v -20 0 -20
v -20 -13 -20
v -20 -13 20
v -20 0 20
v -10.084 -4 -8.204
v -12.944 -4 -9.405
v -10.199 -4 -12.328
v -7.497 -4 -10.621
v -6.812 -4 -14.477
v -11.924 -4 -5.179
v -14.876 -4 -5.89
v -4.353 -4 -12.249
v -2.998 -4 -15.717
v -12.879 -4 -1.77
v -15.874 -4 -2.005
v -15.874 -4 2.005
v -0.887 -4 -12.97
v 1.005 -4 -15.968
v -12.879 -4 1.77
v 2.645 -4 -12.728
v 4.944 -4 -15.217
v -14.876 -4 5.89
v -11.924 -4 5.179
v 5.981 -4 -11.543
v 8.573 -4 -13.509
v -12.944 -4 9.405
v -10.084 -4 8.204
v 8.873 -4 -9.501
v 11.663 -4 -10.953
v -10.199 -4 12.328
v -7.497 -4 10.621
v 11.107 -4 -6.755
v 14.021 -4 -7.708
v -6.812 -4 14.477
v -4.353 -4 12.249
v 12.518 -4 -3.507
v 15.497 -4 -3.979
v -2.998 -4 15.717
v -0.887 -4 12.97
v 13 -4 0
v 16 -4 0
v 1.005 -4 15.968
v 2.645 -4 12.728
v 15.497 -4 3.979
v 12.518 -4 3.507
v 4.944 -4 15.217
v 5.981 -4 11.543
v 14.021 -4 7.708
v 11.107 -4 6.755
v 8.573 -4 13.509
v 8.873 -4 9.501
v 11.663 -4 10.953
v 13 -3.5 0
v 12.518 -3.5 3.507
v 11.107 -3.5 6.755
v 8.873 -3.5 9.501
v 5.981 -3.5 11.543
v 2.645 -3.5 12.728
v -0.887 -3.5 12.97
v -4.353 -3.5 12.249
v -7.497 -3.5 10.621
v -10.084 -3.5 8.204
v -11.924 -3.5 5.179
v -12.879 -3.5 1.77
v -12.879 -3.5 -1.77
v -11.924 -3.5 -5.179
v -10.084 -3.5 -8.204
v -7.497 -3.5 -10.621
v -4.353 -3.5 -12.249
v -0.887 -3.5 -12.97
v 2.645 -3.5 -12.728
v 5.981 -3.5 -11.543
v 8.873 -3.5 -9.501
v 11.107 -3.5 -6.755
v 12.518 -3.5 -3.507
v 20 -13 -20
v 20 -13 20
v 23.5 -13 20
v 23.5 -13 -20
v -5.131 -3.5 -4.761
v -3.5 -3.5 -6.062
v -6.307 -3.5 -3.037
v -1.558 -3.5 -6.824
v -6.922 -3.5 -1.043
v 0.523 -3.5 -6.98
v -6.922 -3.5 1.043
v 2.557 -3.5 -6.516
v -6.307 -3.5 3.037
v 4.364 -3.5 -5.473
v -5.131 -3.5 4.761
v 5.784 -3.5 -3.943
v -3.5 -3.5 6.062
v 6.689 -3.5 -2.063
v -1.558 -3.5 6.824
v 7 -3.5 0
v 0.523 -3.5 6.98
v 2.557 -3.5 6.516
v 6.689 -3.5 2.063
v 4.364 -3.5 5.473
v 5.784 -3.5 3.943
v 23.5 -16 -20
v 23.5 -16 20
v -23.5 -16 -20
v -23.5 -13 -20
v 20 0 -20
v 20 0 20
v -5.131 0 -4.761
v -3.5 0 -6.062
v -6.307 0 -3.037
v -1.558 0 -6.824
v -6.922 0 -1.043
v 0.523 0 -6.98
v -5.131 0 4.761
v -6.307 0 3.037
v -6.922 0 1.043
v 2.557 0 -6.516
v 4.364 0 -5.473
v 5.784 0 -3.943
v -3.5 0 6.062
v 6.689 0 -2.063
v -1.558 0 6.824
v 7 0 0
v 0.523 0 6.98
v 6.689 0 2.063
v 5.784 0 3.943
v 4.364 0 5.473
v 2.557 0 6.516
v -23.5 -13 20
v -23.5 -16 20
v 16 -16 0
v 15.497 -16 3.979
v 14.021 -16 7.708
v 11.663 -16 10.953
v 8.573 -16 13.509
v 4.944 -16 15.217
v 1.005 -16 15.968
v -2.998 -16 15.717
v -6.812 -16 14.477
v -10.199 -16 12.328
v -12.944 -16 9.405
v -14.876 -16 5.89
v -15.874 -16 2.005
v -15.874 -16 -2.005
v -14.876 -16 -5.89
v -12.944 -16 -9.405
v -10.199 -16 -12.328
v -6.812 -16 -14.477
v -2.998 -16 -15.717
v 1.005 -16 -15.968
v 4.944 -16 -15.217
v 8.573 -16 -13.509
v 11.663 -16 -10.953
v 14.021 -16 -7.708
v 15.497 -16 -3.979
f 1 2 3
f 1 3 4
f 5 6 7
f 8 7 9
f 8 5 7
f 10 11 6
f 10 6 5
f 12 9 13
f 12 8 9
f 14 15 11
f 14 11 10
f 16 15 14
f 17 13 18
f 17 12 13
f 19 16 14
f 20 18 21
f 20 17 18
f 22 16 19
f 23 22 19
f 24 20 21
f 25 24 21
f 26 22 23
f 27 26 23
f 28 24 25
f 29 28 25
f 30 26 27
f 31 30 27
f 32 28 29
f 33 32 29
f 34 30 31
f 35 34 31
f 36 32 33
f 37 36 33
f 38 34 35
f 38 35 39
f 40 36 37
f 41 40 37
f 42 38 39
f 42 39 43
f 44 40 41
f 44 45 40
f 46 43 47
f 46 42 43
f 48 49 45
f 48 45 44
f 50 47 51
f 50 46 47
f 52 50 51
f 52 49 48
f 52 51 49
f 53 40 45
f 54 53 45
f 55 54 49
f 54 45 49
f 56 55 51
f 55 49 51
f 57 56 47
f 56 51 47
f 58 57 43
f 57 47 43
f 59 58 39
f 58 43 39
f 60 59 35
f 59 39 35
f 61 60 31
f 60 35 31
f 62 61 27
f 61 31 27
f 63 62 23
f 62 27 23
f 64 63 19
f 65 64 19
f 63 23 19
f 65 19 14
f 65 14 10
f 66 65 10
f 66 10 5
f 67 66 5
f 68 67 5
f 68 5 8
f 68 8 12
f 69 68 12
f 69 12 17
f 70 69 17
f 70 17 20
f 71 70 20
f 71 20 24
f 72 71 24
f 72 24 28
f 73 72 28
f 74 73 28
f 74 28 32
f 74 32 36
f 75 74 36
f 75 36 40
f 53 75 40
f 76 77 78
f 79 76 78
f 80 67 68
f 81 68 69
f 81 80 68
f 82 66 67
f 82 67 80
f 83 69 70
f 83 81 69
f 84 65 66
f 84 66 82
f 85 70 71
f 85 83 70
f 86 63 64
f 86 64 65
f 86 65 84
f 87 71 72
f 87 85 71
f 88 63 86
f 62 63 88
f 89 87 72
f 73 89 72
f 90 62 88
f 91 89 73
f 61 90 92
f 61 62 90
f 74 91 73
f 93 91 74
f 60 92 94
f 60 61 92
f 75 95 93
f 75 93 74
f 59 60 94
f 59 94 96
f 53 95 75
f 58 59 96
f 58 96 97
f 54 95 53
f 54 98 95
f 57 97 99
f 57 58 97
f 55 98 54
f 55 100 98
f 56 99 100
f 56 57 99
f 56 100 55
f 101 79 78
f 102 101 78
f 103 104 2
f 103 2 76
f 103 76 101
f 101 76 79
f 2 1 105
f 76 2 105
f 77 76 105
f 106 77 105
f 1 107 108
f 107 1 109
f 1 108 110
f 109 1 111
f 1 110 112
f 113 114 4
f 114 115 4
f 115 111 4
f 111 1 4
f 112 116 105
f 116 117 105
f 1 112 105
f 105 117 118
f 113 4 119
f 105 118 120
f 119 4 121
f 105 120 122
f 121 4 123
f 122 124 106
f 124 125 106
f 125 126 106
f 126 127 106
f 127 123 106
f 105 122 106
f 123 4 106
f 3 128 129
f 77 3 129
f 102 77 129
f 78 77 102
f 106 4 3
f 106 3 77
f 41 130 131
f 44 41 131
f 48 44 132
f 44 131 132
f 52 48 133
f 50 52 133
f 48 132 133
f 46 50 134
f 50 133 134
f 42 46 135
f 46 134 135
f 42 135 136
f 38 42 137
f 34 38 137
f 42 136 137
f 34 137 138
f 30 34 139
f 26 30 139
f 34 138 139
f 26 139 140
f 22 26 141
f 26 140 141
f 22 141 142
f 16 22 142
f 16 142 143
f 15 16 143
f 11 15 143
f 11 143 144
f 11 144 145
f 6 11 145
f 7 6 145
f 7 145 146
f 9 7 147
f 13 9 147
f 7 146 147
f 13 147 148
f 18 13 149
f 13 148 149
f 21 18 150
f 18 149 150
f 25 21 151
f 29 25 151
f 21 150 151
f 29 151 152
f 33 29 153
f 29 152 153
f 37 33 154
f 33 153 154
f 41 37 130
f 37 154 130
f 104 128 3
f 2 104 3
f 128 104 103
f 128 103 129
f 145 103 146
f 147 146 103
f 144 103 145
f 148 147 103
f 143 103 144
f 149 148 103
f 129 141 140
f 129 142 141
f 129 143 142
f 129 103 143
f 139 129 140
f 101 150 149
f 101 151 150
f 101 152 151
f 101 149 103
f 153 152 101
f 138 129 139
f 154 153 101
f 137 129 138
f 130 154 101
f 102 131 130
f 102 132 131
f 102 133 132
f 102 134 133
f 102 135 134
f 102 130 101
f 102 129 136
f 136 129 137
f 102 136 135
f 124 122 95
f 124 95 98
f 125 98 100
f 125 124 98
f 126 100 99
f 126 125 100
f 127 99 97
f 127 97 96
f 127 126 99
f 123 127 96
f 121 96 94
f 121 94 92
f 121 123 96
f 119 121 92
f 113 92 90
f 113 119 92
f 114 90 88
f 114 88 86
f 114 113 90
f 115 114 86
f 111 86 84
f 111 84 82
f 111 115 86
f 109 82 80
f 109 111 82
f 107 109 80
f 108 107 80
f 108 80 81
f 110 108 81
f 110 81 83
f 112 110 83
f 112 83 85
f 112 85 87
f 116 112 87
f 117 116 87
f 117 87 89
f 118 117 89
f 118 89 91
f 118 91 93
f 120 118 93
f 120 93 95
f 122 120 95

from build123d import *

# Parameters (mm, degrees)
F0_W     = 47
F0_H     = 40
F0_R     = 7
F1_DEPTH = 16
F2_W     = 3.5
F2_H     = 13
F3_DEPTH = 40.001
F4_R     = 13
F4_R_2   = 7
F5_DEPTH = 12.5
F6_R     = 16
F6_R_2   = 13
F7_DEPTH = 12


with BuildPart() as f1:
    # F0 (on Front) → F1 (new body)
    with BuildSketch(Plane.XZ):
        Rectangle(F0_W, F0_H)
        Circle(F0_R, mode=Mode.SUBTRACT)
    extrude(amount=F1_DEPTH)

    # F2 (on face) → F3 (cut, through all)
    with BuildSketch(Plane.XY.offset(20)):
        with Locations((-21.75, -6.5)):
            Rectangle(F2_W, F2_H)
        with Locations((21.75, -6.5)):
            Rectangle(F2_W, F2_H)
    extrude(amount=-F3_DEPTH, mode=Mode.SUBTRACT)

    # F4 (on face) → F5 (cut)
    with BuildSketch(Plane.XZ.offset(16)):
        Circle(F4_R)
        Circle(F4_R_2, mode=Mode.SUBTRACT)
    extrude(amount=-F5_DEPTH, mode=Mode.SUBTRACT)

    # F6 (on face) → F7 (cut)
    with BuildSketch(Plane.XZ.offset(16)):
        Circle(F6_R)
        Circle(F6_R_2, mode=Mode.SUBTRACT)
    extrude(amount=-F7_DEPTH, mode=Mode.SUBTRACT)


solid = f1.part
